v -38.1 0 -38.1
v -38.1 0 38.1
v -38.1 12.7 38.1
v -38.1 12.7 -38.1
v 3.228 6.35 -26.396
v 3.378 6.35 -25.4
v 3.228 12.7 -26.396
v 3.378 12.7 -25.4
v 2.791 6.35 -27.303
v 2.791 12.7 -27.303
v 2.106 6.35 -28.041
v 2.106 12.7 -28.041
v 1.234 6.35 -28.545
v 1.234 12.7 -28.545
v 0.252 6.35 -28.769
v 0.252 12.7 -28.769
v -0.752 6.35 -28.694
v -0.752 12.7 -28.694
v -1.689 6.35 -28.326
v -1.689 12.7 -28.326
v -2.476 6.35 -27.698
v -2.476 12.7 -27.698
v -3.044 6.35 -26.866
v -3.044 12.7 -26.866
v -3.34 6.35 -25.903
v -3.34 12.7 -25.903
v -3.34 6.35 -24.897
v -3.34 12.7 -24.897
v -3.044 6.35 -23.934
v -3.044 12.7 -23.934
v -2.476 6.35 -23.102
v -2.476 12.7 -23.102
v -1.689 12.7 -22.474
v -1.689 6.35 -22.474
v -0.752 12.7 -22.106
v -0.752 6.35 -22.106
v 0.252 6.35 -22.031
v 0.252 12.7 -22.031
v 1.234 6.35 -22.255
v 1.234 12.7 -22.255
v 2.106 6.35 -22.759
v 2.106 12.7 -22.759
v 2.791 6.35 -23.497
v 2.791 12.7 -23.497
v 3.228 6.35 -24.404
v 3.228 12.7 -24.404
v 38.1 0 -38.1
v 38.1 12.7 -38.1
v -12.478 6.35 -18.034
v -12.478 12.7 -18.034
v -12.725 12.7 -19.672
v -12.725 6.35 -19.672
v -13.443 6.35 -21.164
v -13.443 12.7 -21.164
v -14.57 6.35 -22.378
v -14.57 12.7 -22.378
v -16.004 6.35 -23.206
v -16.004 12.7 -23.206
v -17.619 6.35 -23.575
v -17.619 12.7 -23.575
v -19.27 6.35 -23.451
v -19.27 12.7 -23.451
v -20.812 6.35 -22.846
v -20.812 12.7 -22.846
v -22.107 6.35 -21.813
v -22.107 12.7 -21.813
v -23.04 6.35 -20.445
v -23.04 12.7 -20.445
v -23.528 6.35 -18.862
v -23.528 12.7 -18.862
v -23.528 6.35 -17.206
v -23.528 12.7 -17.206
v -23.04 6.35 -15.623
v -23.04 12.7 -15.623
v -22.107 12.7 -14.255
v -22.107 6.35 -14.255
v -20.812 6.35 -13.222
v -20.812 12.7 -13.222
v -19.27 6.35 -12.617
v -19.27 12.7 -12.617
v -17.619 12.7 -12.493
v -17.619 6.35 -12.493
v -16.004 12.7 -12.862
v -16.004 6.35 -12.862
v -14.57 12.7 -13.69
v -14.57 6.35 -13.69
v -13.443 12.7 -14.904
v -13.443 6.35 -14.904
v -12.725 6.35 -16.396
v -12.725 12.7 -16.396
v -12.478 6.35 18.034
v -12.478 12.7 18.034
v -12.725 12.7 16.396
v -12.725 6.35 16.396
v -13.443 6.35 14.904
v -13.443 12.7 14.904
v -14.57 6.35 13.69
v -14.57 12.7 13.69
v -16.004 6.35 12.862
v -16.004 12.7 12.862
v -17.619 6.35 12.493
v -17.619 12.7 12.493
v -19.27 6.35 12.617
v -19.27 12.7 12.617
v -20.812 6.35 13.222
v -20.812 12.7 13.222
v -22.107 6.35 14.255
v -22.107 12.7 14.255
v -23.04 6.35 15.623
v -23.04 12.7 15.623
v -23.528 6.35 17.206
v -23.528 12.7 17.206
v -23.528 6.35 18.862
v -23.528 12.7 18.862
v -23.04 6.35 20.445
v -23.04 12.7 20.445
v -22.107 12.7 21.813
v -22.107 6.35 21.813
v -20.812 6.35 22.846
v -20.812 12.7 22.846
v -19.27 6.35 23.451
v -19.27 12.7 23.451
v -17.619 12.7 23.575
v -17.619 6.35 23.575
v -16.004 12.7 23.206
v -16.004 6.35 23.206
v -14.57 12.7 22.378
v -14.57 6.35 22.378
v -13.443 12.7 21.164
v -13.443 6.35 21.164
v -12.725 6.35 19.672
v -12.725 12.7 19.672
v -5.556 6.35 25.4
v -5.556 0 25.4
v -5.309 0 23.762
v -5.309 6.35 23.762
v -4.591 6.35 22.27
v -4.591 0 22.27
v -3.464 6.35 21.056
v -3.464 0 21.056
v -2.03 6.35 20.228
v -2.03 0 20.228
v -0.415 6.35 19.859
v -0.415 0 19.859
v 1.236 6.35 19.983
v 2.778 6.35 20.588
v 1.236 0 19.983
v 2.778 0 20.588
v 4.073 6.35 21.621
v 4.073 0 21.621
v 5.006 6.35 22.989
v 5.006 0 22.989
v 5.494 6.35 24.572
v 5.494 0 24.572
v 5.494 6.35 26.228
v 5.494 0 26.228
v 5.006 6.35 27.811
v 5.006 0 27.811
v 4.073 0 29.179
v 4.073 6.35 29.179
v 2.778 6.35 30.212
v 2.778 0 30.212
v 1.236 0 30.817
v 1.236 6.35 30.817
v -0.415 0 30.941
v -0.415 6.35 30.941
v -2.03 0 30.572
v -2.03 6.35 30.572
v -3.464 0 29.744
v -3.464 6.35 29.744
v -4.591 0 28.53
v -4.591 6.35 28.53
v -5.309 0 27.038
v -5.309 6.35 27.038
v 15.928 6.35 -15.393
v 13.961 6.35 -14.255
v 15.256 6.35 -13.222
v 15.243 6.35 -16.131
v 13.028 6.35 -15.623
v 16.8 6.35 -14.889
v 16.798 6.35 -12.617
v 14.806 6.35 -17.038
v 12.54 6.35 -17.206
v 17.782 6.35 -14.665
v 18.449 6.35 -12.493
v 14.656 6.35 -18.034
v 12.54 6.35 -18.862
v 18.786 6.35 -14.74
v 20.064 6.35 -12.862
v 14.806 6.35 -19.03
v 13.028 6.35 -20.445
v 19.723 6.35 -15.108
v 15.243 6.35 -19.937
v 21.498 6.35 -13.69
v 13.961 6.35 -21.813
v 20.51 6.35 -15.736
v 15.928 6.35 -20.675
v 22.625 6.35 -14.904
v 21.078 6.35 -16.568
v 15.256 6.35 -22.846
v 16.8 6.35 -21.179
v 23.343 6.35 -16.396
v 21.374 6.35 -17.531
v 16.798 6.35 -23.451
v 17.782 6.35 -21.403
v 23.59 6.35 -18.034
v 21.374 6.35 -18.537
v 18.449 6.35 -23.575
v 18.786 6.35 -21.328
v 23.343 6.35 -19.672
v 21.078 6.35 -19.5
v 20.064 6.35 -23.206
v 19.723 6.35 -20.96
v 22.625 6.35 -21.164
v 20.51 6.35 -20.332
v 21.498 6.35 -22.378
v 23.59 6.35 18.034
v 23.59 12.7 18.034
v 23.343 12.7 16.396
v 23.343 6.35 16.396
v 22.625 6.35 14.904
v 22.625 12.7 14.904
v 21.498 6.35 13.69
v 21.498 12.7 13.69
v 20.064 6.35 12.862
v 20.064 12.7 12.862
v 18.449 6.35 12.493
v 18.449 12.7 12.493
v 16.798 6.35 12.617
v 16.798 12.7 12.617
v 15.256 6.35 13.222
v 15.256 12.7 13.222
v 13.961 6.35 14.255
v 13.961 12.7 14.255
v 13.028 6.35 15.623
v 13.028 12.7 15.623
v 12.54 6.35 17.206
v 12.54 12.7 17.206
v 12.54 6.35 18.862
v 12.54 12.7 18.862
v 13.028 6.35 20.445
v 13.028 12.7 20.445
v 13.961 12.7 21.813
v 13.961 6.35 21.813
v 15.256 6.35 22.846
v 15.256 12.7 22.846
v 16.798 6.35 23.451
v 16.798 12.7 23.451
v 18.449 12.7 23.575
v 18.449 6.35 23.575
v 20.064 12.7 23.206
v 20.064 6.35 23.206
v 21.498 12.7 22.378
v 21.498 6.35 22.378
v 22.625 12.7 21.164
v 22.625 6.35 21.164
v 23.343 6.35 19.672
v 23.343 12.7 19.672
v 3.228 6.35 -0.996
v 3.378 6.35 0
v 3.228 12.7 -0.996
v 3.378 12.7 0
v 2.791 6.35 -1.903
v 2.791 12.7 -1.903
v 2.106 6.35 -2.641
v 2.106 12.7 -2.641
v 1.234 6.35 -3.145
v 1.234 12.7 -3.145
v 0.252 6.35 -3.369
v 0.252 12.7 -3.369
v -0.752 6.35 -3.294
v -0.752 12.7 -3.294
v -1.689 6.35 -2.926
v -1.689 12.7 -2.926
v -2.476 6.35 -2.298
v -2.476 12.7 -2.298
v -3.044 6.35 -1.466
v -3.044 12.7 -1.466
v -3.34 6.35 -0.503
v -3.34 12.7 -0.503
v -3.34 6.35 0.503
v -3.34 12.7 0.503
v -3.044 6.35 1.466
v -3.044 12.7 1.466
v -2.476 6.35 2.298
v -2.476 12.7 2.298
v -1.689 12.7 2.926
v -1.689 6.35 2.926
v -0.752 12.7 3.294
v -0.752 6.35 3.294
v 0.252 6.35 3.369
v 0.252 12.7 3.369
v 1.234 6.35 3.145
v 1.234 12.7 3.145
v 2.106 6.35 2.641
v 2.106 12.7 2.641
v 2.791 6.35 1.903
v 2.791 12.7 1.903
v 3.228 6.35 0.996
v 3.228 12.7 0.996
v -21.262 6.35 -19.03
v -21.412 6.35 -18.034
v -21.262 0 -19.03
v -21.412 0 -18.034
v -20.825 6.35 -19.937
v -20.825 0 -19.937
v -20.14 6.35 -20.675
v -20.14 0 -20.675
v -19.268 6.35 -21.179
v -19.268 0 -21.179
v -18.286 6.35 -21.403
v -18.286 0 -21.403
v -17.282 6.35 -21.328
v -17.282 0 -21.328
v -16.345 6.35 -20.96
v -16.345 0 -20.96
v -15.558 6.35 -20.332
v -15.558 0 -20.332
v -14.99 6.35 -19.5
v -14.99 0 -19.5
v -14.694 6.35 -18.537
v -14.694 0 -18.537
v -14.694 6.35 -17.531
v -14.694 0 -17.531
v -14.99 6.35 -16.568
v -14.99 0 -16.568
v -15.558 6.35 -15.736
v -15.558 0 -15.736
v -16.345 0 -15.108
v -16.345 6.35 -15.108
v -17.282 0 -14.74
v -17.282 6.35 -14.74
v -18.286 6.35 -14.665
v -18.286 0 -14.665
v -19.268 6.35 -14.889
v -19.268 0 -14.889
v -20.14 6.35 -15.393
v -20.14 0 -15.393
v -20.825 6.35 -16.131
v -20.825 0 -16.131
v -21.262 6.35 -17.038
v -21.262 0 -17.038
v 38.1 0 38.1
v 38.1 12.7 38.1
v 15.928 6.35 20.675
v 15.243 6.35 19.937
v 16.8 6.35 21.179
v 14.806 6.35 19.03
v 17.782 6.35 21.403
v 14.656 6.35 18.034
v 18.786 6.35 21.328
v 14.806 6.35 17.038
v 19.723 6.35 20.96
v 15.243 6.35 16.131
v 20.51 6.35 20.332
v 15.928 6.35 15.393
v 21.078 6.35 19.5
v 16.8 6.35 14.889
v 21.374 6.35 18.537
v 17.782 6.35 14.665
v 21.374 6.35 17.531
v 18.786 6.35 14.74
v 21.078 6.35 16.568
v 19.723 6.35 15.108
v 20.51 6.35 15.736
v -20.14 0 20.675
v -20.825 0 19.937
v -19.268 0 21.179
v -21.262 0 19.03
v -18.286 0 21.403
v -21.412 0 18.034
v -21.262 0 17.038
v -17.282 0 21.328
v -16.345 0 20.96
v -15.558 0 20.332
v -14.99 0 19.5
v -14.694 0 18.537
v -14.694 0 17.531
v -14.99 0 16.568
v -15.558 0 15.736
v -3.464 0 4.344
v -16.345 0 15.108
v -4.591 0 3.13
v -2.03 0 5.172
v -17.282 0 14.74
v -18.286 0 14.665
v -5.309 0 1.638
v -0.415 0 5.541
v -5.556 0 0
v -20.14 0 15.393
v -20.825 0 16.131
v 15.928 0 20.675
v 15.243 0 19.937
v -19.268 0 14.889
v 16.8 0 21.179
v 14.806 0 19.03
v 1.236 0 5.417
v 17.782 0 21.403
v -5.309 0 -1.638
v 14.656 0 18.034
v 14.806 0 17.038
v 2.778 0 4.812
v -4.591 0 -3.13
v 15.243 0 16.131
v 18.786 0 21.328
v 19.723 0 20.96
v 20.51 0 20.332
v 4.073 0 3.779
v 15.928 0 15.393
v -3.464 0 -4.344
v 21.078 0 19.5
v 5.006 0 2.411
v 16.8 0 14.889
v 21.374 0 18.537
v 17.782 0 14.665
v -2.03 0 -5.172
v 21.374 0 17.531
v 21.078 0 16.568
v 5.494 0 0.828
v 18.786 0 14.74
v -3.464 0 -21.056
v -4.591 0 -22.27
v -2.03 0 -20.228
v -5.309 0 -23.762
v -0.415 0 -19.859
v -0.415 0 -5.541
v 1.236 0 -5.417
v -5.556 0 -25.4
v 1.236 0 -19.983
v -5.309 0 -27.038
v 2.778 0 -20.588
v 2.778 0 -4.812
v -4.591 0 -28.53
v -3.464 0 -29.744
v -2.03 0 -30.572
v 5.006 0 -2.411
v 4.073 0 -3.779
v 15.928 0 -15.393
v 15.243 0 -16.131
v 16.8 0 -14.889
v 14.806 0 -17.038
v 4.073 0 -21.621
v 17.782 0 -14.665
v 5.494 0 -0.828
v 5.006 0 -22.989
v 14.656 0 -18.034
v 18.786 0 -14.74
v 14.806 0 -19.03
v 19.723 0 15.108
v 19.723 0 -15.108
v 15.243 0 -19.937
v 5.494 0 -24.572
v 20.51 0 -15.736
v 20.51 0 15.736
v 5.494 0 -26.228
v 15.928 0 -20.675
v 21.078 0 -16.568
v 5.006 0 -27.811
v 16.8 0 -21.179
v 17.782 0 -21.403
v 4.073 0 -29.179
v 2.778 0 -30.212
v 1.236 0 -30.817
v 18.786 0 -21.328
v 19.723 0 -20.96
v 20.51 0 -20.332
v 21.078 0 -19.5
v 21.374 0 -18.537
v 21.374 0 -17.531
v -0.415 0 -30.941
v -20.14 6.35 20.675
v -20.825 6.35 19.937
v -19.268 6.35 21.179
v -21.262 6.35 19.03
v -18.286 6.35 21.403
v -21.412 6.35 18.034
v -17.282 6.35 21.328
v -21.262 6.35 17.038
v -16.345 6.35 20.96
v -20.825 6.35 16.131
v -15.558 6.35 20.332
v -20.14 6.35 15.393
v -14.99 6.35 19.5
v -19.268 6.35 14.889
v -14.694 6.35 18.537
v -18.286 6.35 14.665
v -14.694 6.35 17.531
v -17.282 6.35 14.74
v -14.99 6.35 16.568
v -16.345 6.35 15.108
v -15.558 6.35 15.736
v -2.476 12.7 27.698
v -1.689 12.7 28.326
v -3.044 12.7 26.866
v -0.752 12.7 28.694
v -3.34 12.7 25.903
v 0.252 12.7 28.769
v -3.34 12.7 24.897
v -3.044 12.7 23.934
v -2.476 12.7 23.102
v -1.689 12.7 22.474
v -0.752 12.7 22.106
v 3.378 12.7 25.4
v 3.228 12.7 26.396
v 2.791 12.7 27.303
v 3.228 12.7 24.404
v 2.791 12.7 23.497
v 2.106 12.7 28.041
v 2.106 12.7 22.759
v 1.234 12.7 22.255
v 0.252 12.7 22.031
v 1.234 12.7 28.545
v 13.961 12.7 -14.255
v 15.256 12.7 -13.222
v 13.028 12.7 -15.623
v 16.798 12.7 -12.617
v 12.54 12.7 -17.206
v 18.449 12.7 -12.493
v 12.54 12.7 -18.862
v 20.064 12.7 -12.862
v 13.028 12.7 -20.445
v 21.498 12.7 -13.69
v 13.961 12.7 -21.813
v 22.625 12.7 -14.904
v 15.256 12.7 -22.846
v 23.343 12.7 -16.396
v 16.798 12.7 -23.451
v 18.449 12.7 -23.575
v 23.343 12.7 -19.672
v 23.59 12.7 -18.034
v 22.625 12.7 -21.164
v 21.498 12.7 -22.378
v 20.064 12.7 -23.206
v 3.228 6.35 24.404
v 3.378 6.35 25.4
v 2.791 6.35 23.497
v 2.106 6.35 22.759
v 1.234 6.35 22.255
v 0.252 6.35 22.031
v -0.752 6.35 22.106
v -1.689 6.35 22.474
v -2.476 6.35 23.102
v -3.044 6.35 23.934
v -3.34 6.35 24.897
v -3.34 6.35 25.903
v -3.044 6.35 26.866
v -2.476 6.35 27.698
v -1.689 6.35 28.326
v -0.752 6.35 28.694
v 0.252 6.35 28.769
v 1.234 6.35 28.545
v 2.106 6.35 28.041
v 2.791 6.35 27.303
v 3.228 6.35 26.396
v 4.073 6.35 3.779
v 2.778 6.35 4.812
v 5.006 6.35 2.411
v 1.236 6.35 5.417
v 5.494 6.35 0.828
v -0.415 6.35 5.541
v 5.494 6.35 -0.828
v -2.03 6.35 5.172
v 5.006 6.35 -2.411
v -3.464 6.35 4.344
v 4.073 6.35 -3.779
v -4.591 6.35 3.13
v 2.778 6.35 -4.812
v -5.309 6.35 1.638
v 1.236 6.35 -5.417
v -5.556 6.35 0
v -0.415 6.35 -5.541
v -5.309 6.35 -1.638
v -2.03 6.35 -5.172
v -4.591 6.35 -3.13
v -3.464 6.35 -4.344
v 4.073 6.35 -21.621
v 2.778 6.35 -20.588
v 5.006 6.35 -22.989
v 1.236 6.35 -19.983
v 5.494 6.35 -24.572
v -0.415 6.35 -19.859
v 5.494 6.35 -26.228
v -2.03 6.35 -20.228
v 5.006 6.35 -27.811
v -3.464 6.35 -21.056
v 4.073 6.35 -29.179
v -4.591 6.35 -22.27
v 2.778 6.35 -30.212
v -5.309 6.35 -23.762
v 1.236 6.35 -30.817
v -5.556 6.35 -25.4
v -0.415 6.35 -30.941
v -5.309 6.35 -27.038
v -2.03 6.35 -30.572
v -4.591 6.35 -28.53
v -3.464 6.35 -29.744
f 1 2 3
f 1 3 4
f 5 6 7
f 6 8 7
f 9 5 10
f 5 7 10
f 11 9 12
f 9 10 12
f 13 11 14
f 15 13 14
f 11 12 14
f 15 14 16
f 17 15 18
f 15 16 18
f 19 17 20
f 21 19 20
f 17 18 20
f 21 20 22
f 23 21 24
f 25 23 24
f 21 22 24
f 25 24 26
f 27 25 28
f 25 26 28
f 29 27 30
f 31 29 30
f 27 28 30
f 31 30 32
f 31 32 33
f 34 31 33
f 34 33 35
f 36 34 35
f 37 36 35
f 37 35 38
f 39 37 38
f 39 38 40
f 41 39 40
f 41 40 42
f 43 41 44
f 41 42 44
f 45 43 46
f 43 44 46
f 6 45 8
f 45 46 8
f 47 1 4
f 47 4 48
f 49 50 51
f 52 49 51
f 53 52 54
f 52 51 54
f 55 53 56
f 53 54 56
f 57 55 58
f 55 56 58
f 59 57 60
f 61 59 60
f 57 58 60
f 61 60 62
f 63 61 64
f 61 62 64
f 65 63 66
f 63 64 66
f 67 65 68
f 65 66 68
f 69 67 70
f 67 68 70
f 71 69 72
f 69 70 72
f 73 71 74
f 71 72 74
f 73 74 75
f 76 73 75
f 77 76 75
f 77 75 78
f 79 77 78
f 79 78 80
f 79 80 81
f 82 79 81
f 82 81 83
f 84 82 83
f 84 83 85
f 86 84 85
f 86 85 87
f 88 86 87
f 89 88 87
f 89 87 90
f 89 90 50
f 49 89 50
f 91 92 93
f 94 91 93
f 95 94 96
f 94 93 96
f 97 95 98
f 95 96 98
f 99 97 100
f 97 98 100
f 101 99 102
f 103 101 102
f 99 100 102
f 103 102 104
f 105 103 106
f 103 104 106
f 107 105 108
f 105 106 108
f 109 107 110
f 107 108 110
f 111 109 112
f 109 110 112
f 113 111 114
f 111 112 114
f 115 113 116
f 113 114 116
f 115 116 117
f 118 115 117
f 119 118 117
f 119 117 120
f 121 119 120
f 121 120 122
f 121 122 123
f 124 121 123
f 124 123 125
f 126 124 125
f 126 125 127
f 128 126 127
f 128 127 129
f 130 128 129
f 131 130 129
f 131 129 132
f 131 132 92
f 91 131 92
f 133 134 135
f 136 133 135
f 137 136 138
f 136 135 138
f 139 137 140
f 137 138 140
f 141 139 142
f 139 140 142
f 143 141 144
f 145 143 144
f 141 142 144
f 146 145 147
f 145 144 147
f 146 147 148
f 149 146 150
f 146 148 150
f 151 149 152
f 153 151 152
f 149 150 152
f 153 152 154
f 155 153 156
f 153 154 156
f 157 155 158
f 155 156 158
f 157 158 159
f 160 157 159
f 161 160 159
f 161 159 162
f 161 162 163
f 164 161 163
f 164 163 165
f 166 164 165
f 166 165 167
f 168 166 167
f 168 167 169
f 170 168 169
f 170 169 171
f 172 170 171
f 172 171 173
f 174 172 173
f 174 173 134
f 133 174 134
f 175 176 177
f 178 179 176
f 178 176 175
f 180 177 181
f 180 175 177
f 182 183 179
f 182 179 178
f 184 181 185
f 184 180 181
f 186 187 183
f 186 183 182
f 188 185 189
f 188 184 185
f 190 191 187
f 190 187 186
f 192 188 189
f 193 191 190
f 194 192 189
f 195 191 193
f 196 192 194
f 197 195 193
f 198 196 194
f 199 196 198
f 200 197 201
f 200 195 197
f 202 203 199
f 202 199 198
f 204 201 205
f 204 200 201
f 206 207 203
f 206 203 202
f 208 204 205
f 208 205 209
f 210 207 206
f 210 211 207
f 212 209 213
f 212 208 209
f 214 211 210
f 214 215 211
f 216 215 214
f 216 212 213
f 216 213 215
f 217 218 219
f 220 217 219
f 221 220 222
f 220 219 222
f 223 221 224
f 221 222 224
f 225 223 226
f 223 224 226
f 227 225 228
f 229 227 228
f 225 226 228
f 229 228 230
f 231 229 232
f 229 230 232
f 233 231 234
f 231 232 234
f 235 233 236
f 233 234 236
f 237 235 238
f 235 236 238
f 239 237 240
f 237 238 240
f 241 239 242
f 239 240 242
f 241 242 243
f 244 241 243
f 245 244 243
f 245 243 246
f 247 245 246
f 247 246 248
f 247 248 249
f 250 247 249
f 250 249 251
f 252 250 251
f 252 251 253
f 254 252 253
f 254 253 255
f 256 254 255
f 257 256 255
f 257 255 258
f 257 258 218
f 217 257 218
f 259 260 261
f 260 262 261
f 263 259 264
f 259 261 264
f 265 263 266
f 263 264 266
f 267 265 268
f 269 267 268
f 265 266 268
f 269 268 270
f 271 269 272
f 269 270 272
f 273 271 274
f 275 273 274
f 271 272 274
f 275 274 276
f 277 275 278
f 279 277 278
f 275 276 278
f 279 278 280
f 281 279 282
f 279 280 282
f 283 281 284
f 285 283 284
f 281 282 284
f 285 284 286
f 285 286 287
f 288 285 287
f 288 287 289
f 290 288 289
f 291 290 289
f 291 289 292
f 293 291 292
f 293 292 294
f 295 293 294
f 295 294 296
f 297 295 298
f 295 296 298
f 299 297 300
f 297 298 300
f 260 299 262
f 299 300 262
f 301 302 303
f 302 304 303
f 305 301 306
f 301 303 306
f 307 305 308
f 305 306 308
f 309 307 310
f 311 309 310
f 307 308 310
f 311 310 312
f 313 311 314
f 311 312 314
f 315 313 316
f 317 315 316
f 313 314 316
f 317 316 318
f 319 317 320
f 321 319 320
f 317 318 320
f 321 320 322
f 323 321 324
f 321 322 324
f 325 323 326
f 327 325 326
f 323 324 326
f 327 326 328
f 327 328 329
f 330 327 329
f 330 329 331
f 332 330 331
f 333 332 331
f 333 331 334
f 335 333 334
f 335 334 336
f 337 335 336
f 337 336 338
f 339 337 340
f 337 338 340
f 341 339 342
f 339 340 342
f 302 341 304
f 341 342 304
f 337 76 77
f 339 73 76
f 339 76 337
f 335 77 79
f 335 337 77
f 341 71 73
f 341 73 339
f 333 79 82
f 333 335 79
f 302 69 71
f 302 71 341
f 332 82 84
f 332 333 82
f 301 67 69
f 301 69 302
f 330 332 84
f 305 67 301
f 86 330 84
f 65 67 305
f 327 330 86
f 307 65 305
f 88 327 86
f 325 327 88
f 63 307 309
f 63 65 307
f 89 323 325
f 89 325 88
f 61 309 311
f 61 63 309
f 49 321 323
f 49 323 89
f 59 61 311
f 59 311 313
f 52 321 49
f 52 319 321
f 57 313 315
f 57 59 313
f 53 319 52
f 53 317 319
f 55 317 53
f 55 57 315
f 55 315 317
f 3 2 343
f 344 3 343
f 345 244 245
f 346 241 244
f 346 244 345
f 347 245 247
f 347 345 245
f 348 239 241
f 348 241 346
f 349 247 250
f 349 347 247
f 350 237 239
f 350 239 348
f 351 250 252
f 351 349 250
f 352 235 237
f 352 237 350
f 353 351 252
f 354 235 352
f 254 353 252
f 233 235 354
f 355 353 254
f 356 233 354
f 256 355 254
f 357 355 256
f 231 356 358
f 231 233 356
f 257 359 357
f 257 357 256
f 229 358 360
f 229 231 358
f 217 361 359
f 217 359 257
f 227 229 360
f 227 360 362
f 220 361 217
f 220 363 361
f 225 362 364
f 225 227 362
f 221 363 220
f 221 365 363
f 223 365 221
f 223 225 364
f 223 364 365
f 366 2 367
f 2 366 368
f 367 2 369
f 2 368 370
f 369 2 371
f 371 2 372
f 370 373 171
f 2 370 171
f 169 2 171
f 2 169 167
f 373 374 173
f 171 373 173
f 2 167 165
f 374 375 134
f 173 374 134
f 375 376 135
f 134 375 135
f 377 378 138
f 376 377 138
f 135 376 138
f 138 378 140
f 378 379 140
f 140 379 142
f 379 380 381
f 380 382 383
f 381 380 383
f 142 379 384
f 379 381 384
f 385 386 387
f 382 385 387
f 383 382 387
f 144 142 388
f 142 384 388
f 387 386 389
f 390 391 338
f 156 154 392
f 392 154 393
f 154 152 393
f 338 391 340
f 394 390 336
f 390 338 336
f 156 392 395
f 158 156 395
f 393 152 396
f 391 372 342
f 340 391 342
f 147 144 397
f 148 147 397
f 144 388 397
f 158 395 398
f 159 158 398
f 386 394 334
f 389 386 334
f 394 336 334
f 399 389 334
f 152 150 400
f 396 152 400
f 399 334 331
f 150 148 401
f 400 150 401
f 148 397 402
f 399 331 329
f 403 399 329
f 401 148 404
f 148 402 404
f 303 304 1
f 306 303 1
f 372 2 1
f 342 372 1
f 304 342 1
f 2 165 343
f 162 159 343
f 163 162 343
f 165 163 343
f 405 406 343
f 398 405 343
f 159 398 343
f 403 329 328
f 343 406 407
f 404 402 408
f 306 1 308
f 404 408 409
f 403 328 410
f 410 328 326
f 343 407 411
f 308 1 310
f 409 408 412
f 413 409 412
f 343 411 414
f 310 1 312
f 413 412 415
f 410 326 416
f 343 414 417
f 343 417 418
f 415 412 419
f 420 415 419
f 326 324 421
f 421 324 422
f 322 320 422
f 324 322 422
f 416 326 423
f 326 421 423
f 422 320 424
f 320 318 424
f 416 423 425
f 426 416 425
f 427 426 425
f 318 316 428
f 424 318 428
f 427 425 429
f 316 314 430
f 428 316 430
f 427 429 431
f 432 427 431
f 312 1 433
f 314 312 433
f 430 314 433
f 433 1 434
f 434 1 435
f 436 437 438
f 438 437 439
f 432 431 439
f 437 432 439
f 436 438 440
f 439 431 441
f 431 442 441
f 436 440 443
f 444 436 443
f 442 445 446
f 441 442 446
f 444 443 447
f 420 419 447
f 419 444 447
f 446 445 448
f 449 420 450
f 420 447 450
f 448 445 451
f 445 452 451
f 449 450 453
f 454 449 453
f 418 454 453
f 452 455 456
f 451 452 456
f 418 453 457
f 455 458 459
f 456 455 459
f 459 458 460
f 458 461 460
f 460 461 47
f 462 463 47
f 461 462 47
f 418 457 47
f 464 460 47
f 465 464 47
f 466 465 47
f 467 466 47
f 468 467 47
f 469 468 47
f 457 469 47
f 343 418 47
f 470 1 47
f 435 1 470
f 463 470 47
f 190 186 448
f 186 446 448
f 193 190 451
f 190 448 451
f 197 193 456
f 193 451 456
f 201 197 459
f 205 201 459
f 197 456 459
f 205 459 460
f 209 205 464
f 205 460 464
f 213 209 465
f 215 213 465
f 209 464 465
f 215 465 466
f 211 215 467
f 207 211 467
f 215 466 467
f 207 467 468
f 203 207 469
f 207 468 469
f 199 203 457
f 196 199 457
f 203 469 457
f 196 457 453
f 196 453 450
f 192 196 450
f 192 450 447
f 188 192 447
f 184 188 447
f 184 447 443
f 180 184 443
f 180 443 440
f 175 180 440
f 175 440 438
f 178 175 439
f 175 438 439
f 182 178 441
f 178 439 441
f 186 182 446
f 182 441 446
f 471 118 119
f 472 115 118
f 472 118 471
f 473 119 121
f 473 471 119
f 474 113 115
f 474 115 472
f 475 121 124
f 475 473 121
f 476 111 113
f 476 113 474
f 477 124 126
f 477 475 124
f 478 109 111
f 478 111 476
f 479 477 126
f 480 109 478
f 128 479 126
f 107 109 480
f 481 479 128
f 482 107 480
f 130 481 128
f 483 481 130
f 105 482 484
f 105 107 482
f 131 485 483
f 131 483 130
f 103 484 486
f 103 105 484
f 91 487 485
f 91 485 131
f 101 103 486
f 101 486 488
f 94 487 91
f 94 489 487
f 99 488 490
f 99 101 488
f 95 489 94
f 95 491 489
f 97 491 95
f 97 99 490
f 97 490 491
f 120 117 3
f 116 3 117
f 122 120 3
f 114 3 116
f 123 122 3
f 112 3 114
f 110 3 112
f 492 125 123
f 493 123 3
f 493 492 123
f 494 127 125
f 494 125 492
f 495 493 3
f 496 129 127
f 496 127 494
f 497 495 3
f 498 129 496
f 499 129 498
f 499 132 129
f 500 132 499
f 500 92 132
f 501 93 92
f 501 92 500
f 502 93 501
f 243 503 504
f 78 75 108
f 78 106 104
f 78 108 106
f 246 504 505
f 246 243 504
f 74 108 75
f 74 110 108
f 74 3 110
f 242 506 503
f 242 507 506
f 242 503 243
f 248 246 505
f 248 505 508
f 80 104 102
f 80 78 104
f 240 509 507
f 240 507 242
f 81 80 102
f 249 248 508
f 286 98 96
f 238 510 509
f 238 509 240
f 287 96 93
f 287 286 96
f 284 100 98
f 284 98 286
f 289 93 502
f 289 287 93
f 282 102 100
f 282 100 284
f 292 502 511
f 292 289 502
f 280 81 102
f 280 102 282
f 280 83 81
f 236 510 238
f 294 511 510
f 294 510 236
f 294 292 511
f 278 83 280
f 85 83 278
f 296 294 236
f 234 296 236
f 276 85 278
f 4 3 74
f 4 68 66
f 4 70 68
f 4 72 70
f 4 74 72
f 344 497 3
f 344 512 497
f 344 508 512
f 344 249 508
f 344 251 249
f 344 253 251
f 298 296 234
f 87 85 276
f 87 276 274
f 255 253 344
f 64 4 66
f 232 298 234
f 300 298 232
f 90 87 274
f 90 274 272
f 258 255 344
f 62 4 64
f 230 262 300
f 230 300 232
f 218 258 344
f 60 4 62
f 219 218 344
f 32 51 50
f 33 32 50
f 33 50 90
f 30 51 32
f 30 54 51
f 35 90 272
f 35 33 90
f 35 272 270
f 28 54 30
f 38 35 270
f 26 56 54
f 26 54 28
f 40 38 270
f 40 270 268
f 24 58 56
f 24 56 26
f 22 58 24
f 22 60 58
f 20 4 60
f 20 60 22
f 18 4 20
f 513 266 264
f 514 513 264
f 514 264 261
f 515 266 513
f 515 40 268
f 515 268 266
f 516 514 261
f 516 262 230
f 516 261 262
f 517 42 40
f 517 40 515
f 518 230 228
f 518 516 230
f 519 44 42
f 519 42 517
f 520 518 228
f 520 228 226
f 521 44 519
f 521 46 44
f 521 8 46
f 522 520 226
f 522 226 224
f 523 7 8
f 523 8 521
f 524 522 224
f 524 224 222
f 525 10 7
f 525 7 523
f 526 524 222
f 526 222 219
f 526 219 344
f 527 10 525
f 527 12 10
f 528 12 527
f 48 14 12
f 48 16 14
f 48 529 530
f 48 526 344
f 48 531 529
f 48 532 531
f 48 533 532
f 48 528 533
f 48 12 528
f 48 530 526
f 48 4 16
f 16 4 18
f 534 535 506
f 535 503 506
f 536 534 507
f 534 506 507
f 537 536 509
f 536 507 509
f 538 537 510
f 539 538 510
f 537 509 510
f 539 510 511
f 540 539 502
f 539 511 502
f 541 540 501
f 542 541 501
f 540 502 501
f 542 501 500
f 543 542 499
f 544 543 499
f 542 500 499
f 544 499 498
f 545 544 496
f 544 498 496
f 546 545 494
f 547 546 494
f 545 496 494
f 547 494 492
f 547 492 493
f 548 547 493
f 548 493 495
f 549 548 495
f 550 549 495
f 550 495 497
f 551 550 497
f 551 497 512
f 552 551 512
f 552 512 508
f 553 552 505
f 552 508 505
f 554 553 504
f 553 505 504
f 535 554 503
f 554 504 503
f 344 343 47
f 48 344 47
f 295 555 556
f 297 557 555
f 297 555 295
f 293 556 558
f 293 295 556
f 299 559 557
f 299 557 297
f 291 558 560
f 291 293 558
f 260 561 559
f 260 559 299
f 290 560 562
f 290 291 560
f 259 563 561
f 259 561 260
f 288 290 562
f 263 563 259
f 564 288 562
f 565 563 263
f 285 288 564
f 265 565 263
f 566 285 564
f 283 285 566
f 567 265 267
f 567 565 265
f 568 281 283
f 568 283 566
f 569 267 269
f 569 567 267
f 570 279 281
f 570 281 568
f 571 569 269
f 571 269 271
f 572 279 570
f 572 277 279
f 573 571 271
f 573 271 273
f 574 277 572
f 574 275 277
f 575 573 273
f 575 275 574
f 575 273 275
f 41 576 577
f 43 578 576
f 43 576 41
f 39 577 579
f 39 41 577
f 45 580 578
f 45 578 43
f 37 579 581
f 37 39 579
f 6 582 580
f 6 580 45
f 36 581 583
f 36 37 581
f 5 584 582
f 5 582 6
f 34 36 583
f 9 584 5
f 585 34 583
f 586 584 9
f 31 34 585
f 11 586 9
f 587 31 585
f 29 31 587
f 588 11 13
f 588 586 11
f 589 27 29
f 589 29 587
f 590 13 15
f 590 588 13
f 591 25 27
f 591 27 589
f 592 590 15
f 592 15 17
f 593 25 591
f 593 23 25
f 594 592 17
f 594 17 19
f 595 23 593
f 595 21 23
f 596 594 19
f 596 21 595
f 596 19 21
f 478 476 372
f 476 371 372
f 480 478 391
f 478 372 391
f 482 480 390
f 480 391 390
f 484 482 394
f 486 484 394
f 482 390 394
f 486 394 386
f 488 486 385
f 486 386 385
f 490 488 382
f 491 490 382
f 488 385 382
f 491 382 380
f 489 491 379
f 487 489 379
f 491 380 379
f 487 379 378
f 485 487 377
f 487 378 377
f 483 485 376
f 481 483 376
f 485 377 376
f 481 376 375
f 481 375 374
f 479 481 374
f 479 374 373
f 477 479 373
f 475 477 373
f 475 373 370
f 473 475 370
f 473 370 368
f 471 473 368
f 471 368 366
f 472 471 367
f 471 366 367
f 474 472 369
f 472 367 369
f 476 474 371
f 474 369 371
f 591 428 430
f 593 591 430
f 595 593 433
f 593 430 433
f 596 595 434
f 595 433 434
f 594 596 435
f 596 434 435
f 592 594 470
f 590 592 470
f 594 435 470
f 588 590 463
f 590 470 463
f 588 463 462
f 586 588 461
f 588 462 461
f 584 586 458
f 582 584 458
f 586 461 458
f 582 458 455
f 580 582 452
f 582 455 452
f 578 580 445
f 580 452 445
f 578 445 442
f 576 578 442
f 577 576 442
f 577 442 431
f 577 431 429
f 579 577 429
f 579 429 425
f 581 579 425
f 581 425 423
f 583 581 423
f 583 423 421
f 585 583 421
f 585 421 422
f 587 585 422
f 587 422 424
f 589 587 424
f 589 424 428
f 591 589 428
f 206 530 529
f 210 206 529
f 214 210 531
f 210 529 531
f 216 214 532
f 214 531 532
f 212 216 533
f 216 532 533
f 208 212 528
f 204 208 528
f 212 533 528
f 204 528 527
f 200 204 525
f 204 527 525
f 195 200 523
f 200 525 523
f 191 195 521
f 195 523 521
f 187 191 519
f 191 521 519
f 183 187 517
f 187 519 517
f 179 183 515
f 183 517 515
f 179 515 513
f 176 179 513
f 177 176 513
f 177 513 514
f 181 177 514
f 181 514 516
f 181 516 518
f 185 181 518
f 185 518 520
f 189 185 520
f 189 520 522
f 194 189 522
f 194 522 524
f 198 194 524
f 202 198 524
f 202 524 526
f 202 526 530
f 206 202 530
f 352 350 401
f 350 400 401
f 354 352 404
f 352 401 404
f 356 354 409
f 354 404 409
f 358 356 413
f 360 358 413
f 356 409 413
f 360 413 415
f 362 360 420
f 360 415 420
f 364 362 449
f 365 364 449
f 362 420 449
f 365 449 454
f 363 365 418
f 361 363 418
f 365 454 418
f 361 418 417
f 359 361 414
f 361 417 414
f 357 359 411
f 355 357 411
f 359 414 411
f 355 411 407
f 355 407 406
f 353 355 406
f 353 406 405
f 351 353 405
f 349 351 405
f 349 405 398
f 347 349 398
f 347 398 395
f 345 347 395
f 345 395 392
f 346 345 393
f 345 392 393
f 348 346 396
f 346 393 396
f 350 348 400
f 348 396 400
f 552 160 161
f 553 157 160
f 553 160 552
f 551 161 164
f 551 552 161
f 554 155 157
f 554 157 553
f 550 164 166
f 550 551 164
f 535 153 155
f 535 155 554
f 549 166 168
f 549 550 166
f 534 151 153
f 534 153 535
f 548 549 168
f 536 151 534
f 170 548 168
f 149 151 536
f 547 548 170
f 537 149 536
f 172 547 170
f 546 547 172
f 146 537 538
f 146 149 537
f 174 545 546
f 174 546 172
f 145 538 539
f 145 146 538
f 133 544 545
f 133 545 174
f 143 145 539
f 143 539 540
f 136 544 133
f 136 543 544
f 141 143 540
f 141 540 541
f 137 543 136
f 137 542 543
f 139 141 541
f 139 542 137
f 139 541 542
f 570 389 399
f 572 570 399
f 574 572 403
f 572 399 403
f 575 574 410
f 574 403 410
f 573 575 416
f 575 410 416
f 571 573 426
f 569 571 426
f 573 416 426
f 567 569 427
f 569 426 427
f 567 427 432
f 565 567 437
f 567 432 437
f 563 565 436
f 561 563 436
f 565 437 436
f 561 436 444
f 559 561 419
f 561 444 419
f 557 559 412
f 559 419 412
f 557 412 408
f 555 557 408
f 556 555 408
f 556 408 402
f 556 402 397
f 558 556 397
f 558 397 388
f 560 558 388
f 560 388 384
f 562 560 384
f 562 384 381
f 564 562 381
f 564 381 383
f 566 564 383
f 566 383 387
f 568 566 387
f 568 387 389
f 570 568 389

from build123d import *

# Parameters (mm, degrees)
SKETCH1_W                                        = 76.2
SKETCH1_H                                        = 76.2
BOSS_EXTRUDE1_DEPTH                              = 12.7
CBORE_FOR_1_4_SOCKET_HEAD_CAP_SCREW2_D           = 6.7564
CBORE_FOR_1_4_SOCKET_HEAD_CAP_SCREW2_CBORE_D     = 11.1125
CBORE_FOR_1_4_SOCKET_HEAD_CAP_SCREW2_CBORE_DEPTH = 6.35
CBORE_FOR_1_4_SOCKET_HEAD_CAP_SCREW1_D           = 6.7564
CBORE_FOR_1_4_SOCKET_HEAD_CAP_SCREW1_CBORE_D     = 11.1125
CBORE_FOR_1_4_SOCKET_HEAD_CAP_SCREW1_CBORE_DEPTH = 6.35


with BuildPart() as part:
    # Sketch1 → Boss-Extrude1 (new body)
    with BuildSketch(Plane(origin=(0, 0, 0), x_dir=(1, 0, 0), z_dir=(0, 1, 0))):
        Rectangle(SKETCH1_W, SKETCH1_H)
    extrude(amount=BOSS_EXTRUDE1_DEPTH)

    # CBORE for 1/4 Socket Head Cap Screw2 (through all)
    with Locations(Plane(origin=(0, 12.7, 0), x_dir=(1, 0, 0), z_dir=(0, 1, 0))):
        with Locations((-18.034, 18.034), (18.034, 18.034), (18.034, -18.034), (-18.034, -18.034)):
            CounterBoreHole(CBORE_FOR_1_4_SOCKET_HEAD_CAP_SCREW2_D / 2, CBORE_FOR_1_4_SOCKET_HEAD_CAP_SCREW2_CBORE_D / 2, CBORE_FOR_1_4_SOCKET_HEAD_CAP_SCREW2_CBORE_DEPTH)

    # CBORE for 1/4 Socket Head Cap Screw1 (through all)
    with Locations(Plane(origin=(0, 0, 0), x_dir=(-1, 0, 0), z_dir=(0, -1, 0))):
        with Locations((0, 25.4), (0, 0), (0, -25.4)):
            CounterBoreHole(CBORE_FOR_1_4_SOCKET_HEAD_CAP_SCREW1_D / 2, CBORE_FOR_1_4_SOCKET_HEAD_CAP_SCREW1_CBORE_D / 2, CBORE_FOR_1_4_SOCKET_HEAD_CAP_SCREW1_CBORE_DEPTH)


solid = part.part
